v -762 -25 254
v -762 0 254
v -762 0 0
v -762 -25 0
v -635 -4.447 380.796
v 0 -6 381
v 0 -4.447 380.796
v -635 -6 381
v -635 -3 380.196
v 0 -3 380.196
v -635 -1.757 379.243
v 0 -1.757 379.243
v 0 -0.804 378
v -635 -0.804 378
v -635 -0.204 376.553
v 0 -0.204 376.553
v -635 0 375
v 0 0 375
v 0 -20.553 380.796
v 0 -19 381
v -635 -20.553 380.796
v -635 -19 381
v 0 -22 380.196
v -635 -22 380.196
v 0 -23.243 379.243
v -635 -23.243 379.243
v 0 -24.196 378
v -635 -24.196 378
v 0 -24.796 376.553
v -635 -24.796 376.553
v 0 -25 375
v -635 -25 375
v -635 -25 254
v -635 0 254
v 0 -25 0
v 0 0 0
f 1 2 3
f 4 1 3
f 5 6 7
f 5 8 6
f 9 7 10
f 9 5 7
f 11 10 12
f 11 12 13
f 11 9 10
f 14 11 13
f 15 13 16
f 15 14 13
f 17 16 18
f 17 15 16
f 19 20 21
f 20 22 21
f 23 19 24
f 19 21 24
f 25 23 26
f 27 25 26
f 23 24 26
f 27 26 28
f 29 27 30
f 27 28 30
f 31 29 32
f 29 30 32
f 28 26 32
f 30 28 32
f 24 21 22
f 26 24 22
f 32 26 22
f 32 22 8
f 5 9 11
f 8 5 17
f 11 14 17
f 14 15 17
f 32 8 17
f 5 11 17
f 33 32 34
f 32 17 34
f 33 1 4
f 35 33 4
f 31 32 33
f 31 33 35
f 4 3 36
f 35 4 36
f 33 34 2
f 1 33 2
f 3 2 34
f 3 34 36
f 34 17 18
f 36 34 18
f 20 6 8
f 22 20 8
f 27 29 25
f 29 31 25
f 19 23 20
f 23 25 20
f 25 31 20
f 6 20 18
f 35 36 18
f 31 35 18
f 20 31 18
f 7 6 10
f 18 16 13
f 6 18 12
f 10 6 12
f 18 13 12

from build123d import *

# Parameters (mm, degrees)
F1_DEPTH = 25
F2_R     = 6
F3_R     = 6


with BuildPart() as f1:
    # F0 (on Front) → F1 (new body)
    with BuildSketch(Plane.XZ):
        Polygon((0, 381), (-635, 381), (-635, 254), (-762, 254), (-762, 0), (0, 0), align=None)
    extrude(amount=F1_DEPTH)

    # F2
    f2_edges = [f1.edges().sort_by_distance(p)[0] for p in [
        (-317.5, -25, 381),
    ]]
    fillet(f2_edges, radius=F2_R)

    # F3
    f3_edges = [f1.edges().sort_by_distance(p)[0] for p in [
        (-317.5, 0, 381),
    ]]
    fillet(f3_edges, radius=F3_R)


solid = f1.part
